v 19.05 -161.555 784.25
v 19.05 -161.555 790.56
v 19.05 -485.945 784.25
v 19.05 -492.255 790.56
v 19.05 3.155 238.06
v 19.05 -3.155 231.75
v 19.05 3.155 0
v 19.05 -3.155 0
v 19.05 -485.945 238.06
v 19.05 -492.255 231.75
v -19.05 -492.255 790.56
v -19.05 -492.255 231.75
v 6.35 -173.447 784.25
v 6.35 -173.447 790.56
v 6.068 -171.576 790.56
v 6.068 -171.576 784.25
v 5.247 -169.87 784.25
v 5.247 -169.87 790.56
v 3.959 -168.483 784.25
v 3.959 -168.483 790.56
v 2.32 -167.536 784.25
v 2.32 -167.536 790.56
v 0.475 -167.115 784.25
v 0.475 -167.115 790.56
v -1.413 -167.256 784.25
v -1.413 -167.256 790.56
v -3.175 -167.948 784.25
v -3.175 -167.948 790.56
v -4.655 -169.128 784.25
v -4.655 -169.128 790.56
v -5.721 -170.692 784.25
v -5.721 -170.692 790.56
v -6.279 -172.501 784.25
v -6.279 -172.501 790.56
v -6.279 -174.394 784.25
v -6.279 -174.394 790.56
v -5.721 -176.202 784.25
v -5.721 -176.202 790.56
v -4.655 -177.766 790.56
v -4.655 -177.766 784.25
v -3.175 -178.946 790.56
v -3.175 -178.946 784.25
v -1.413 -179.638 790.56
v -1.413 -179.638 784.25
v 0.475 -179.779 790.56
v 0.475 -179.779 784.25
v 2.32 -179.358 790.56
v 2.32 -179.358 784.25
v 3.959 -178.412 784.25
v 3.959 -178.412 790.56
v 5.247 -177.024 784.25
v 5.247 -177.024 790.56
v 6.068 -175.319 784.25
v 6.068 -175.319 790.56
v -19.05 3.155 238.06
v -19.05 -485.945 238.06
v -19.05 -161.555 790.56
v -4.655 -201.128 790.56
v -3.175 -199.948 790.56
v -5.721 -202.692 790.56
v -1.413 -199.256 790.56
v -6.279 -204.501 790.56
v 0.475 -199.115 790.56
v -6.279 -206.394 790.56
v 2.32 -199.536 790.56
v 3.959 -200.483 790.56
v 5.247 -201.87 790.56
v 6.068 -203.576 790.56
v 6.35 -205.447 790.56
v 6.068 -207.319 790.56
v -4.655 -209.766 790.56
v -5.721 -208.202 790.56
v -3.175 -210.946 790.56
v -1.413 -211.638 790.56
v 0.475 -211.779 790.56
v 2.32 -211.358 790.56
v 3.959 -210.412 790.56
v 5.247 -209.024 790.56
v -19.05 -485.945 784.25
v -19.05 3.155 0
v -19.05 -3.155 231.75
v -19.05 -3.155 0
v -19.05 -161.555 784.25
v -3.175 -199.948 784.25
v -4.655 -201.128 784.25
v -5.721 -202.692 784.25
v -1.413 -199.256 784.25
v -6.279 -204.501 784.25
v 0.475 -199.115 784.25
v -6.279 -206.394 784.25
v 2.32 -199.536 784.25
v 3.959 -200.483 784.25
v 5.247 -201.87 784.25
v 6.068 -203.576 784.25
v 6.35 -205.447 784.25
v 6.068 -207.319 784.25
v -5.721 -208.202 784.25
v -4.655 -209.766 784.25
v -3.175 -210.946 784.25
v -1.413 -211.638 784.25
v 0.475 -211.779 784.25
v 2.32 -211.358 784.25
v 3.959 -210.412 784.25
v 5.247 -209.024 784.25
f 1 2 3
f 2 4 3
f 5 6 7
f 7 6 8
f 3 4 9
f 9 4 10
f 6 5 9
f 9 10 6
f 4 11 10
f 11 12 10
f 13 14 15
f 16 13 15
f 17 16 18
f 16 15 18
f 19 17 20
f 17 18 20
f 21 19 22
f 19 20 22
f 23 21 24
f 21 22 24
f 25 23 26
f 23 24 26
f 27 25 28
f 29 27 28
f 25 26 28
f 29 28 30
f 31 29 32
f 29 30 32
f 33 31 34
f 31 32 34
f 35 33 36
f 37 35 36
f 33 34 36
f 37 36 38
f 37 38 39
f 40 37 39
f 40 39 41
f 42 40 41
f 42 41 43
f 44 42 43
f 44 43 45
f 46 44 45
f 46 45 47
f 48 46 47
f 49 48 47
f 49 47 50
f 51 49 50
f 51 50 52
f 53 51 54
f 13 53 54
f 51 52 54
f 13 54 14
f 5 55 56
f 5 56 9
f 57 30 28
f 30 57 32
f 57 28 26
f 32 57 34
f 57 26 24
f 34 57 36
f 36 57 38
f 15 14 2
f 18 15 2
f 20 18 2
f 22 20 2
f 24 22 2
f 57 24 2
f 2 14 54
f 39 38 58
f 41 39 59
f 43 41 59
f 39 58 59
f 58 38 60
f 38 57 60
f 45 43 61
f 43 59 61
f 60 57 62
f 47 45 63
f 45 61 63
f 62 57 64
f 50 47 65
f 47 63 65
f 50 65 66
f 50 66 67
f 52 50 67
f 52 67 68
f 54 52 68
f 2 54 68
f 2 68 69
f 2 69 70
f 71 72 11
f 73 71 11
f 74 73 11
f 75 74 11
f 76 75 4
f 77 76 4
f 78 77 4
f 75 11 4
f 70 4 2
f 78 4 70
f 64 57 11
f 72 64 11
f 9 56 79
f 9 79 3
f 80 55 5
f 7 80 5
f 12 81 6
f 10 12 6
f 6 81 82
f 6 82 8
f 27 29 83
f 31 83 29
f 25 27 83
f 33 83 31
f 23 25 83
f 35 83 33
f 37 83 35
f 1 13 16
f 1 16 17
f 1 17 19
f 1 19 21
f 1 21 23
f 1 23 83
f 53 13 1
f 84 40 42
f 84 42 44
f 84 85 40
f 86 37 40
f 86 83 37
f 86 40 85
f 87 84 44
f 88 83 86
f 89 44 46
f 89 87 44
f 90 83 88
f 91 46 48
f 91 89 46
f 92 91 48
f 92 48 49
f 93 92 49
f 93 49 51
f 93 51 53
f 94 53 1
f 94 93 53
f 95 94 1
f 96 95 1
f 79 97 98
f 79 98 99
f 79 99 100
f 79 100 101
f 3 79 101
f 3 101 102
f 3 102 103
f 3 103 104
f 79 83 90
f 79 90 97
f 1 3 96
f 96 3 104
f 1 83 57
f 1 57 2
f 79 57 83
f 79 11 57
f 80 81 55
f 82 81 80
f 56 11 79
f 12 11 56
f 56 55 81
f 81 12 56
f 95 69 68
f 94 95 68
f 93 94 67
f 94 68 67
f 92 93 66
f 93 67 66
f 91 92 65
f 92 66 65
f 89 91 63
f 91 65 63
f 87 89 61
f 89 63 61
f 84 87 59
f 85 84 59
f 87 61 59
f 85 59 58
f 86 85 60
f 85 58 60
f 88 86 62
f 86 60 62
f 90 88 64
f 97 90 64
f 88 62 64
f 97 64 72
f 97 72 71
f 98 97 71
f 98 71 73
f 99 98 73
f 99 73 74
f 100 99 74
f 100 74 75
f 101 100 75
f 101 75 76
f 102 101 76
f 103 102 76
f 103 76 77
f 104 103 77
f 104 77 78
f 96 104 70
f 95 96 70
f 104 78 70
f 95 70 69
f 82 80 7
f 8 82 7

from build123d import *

# Parameters (mm, degrees)
CROQUIS1_W              = 38.1
CROQUIS1_H              = 6.31
SALIENTE_EXTRUIR1_DEPTH = 238.06
CROQUIS2_W              = 38.1
CROQUIS2_H              = 6.31
SALIENTE_EXTRUIR2_DEPTH = 489.1
CROQUIS3_W              = 38.1
CROQUIS3_H              = 6.31
SALIENTE_EXTRUIR3_DEPTH = 552.5
CROQUIS4_W              = 38.1
CROQUIS4_H              = 6.31
SALIENTE_EXTRUIR4_DEPTH = 324.39
CROQUIS5_R              = 6.35
CORTAR_EXTRUIR1_DEPTH   = 6.31


with BuildPart() as part:
    # Croquis1 → Saliente-Extruir1 (new body)
    with BuildSketch(Plane.XY):
        Rectangle(CROQUIS1_W, CROQUIS1_H)
    extrude(amount=SALIENTE_EXTRUIR1_DEPTH)

    # Croquis2 → Saliente-Extruir2 (add)
    with BuildSketch(Plane.XZ.offset(3.155)):
        with Locations((0, 234.905)):
            Rectangle(CROQUIS2_W, CROQUIS2_H)
    extrude(amount=SALIENTE_EXTRUIR2_DEPTH)

    # Croquis3 → Saliente-Extruir3 (add)
    with BuildSketch(Plane.XY.offset(238.06)):
        with Locations((0, -489.1)):
            Rectangle(CROQUIS3_W, CROQUIS3_H)
    extrude(amount=SALIENTE_EXTRUIR3_DEPTH)

    # Croquis4 → Saliente-Extruir4 (add)
    with BuildSketch(Plane(origin=(0, -485.945, 0), x_dir=(1, 0, 0), z_dir=(0, 1, 0))):
        with Locations((0, -787.405)):
            Rectangle(CROQUIS4_W, CROQUIS4_H)
    extrude(amount=SALIENTE_EXTRUIR4_DEPTH)

    # Croquis5 → Cortar-Extruir1 (cut)
    with BuildSketch(Plane.XY.offset(790.56)):
        with Locations((0, -173.447204666)):
            Circle(CROQUIS5_R)
        with Locations((0, -205.447204666)):
            Circle(CROQUIS5_R)
    extrude(amount=-CORTAR_EXTRUIR1_DEPTH, mode=Mode.SUBTRACT)


solid = part.part
